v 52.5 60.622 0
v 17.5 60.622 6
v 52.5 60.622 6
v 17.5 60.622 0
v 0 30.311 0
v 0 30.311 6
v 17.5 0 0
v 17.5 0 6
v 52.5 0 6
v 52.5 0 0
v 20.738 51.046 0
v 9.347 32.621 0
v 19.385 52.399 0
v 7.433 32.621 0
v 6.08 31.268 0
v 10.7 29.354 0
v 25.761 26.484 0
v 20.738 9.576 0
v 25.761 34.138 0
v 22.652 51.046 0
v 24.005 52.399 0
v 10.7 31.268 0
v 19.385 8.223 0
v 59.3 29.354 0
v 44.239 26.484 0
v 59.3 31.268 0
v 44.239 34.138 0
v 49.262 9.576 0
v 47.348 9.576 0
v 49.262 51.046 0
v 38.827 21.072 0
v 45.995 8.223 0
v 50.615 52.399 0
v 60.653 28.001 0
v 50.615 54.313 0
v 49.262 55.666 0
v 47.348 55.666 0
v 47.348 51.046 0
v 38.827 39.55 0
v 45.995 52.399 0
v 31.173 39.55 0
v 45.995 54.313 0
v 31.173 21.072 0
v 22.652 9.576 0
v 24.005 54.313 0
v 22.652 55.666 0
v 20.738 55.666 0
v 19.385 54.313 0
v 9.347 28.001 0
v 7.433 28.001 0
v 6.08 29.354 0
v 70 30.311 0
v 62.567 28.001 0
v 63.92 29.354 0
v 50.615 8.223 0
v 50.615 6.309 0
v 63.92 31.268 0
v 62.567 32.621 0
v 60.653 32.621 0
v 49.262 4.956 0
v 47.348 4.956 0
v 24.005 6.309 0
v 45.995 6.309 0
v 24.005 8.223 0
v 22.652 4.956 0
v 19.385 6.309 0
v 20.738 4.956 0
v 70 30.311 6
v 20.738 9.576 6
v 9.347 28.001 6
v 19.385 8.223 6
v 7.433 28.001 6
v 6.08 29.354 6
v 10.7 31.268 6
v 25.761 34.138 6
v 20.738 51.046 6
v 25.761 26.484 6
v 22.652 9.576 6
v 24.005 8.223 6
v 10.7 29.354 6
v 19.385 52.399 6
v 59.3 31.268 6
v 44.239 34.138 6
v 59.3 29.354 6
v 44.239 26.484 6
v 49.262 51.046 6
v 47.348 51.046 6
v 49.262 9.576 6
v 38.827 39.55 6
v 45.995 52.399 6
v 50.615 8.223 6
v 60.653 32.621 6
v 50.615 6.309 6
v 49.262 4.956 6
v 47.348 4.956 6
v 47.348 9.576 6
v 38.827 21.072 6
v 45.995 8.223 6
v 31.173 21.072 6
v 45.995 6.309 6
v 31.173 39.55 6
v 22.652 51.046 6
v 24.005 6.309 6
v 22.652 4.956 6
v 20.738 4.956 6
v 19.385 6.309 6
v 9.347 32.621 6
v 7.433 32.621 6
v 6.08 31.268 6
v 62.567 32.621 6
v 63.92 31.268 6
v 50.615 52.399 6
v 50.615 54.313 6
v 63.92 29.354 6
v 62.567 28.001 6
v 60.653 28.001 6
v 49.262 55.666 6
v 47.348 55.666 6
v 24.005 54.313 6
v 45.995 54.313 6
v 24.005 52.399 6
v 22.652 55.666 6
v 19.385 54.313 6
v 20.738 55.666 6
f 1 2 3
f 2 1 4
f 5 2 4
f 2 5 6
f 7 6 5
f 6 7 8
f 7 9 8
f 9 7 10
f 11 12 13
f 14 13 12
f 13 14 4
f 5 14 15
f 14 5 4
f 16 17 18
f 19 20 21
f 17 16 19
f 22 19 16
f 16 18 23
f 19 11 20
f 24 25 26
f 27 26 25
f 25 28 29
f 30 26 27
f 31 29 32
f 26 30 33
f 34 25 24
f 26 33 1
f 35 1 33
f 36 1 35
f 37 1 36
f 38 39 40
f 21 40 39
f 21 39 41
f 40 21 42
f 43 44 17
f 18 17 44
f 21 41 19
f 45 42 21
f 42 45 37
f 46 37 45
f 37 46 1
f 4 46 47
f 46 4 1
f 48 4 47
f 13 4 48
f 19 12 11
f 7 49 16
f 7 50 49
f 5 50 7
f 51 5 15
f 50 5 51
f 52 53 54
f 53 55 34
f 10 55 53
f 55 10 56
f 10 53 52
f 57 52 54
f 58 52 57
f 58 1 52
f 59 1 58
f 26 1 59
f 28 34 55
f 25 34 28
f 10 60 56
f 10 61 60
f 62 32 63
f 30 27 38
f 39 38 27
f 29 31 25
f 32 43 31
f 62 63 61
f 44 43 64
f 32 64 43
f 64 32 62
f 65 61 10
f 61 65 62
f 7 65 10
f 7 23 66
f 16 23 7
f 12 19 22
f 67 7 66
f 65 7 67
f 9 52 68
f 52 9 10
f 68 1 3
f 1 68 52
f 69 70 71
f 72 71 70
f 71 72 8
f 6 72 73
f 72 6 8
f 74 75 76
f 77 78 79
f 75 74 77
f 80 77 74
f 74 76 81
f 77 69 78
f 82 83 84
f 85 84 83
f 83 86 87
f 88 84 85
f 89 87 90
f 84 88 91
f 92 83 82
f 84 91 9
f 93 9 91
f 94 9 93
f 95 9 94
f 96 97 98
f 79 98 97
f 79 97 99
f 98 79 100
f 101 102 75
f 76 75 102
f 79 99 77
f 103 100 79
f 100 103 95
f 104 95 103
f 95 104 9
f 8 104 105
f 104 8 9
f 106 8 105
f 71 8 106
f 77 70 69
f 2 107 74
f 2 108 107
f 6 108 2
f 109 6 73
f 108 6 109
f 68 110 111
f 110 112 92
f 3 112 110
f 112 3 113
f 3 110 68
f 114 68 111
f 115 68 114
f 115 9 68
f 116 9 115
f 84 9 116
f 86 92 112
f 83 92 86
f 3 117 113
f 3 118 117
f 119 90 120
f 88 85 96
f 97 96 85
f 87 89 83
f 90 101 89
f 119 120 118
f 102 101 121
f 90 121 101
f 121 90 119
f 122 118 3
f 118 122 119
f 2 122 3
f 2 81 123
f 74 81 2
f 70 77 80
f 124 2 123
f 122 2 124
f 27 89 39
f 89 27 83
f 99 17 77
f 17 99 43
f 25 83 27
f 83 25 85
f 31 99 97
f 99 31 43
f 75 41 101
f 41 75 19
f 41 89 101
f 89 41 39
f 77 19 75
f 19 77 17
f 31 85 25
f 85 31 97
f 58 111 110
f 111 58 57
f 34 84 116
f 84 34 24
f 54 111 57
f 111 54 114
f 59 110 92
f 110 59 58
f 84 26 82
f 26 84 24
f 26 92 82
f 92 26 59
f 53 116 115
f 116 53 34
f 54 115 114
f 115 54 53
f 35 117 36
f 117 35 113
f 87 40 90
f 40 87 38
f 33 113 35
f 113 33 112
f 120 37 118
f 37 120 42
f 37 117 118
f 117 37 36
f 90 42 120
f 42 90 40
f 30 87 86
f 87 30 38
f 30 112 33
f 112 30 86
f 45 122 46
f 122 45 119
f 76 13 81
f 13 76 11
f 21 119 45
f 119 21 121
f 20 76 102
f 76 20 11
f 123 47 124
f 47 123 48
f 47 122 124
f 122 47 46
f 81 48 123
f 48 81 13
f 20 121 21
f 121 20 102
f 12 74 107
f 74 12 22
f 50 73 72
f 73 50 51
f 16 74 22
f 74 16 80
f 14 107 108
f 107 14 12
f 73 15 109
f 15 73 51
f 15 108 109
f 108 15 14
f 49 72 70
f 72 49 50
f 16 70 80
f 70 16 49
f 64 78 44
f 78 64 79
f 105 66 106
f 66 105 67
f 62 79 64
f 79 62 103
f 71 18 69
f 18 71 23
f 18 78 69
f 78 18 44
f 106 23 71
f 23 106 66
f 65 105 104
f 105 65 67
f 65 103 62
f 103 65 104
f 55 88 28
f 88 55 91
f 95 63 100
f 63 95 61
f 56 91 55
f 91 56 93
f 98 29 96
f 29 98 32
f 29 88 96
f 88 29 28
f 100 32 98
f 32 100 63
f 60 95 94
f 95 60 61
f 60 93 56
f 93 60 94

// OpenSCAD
$fn = 32;

// ----------------------------------------------------------------------
// Polygon plate: 6-gon R35, 6 bolt windows
// ----------------------------------------------------------------------

// --- parameters (mm) ---
sides = 6;                // number of polygon sides
plate_r = 35;             // circumscribed radius of the polygon
bore_r = 10;              // centre bore radius
bolts = 6;                // number of bolt windows
ring_r = 26.61;           // bolt-circle radius
bolt_r = 2.5;             // bolt window radius
plate_t = 6;              // plate thickness, Z (extrusion height)
fit_tol = 0.1;            // declared fit tolerance (prompt contract)
free_tol = 0.3;           // declared free tolerance (prompt contract)

plate_d = 2 * plate_r;  // circumscribed diameter
bore_d = 2 * bore_r;  // centre bore diameter
bolt_d = 2 * bolt_r;  // bolt window diameter
ring_d = 2 * ring_r;  // bolt-circle diameter

profile = [[70, 30.311], [52.5, 60.622], [17.5, 60.622], [0, 30.311], [17.5, 0], [52.5, 0]];  // primary outline, 6 points, counter clockwise
void_1 = [[44.239, 34.138], [38.827, 39.55], [31.173, 39.55], [25.761, 34.138], [25.761, 26.484], [31.173, 21.072], [38.827, 21.072], [44.239, 26.484]];  // centre bore, 8 points
void_2 = [[63.92, 31.268], [62.567, 32.621], [60.653, 32.621], [59.3, 31.268], [59.3, 29.354], [60.653, 28.001], [62.567, 28.001], [63.92, 29.354]];  // bolt window 1, 8 points
void_3 = [[50.615, 54.313], [49.262, 55.666], [47.348, 55.666], [45.995, 54.313], [45.995, 52.399], [47.348, 51.046], [49.262, 51.046], [50.615, 52.399]];  // bolt window 2, 8 points
void_4 = [[24.005, 54.313], [22.652, 55.666], [20.738, 55.666], [19.385, 54.313], [19.385, 52.399], [20.738, 51.046], [22.652, 51.046], [24.005, 52.399]];  // bolt window 3, 8 points
void_5 = [[10.7, 31.268], [9.347, 32.621], [7.433, 32.621], [6.08, 31.268], [6.08, 29.354], [7.433, 28.001], [9.347, 28.001], [10.7, 29.354]];  // bolt window 4, 8 points
void_6 = [[24.005, 8.223], [22.652, 9.576], [20.738, 9.576], [19.385, 8.223], [19.385, 6.309], [20.738, 4.956], [22.652, 4.956], [24.005, 6.309]];  // bolt window 5, 8 points
void_7 = [[50.615, 8.223], [49.262, 9.576], [47.348, 9.576], [45.995, 8.223], [45.995, 6.309], [47.348, 4.956], [49.262, 4.956], [50.615, 6.309]];  // bolt window 6, 8 points

// --- the one profile operation ---
difference() {
  linear_extrude(height = plate_t) polygon(points = profile);
  translate([0, 0, -1])
    linear_extrude(height = plate_t + 2) polygon(points = void_1);
  translate([0, 0, -1])
    linear_extrude(height = plate_t + 2) polygon(points = void_2);
  translate([0, 0, -1])
    linear_extrude(height = plate_t + 2) polygon(points = void_3);
  translate([0, 0, -1])
    linear_extrude(height = plate_t + 2) polygon(points = void_4);
  translate([0, 0, -1])
    linear_extrude(height = plate_t + 2) polygon(points = void_5);
  translate([0, 0, -1])
    linear_extrude(height = plate_t + 2) polygon(points = void_6);
  translate([0, 0, -1])
    linear_extrude(height = plate_t + 2) polygon(points = void_7);
}
